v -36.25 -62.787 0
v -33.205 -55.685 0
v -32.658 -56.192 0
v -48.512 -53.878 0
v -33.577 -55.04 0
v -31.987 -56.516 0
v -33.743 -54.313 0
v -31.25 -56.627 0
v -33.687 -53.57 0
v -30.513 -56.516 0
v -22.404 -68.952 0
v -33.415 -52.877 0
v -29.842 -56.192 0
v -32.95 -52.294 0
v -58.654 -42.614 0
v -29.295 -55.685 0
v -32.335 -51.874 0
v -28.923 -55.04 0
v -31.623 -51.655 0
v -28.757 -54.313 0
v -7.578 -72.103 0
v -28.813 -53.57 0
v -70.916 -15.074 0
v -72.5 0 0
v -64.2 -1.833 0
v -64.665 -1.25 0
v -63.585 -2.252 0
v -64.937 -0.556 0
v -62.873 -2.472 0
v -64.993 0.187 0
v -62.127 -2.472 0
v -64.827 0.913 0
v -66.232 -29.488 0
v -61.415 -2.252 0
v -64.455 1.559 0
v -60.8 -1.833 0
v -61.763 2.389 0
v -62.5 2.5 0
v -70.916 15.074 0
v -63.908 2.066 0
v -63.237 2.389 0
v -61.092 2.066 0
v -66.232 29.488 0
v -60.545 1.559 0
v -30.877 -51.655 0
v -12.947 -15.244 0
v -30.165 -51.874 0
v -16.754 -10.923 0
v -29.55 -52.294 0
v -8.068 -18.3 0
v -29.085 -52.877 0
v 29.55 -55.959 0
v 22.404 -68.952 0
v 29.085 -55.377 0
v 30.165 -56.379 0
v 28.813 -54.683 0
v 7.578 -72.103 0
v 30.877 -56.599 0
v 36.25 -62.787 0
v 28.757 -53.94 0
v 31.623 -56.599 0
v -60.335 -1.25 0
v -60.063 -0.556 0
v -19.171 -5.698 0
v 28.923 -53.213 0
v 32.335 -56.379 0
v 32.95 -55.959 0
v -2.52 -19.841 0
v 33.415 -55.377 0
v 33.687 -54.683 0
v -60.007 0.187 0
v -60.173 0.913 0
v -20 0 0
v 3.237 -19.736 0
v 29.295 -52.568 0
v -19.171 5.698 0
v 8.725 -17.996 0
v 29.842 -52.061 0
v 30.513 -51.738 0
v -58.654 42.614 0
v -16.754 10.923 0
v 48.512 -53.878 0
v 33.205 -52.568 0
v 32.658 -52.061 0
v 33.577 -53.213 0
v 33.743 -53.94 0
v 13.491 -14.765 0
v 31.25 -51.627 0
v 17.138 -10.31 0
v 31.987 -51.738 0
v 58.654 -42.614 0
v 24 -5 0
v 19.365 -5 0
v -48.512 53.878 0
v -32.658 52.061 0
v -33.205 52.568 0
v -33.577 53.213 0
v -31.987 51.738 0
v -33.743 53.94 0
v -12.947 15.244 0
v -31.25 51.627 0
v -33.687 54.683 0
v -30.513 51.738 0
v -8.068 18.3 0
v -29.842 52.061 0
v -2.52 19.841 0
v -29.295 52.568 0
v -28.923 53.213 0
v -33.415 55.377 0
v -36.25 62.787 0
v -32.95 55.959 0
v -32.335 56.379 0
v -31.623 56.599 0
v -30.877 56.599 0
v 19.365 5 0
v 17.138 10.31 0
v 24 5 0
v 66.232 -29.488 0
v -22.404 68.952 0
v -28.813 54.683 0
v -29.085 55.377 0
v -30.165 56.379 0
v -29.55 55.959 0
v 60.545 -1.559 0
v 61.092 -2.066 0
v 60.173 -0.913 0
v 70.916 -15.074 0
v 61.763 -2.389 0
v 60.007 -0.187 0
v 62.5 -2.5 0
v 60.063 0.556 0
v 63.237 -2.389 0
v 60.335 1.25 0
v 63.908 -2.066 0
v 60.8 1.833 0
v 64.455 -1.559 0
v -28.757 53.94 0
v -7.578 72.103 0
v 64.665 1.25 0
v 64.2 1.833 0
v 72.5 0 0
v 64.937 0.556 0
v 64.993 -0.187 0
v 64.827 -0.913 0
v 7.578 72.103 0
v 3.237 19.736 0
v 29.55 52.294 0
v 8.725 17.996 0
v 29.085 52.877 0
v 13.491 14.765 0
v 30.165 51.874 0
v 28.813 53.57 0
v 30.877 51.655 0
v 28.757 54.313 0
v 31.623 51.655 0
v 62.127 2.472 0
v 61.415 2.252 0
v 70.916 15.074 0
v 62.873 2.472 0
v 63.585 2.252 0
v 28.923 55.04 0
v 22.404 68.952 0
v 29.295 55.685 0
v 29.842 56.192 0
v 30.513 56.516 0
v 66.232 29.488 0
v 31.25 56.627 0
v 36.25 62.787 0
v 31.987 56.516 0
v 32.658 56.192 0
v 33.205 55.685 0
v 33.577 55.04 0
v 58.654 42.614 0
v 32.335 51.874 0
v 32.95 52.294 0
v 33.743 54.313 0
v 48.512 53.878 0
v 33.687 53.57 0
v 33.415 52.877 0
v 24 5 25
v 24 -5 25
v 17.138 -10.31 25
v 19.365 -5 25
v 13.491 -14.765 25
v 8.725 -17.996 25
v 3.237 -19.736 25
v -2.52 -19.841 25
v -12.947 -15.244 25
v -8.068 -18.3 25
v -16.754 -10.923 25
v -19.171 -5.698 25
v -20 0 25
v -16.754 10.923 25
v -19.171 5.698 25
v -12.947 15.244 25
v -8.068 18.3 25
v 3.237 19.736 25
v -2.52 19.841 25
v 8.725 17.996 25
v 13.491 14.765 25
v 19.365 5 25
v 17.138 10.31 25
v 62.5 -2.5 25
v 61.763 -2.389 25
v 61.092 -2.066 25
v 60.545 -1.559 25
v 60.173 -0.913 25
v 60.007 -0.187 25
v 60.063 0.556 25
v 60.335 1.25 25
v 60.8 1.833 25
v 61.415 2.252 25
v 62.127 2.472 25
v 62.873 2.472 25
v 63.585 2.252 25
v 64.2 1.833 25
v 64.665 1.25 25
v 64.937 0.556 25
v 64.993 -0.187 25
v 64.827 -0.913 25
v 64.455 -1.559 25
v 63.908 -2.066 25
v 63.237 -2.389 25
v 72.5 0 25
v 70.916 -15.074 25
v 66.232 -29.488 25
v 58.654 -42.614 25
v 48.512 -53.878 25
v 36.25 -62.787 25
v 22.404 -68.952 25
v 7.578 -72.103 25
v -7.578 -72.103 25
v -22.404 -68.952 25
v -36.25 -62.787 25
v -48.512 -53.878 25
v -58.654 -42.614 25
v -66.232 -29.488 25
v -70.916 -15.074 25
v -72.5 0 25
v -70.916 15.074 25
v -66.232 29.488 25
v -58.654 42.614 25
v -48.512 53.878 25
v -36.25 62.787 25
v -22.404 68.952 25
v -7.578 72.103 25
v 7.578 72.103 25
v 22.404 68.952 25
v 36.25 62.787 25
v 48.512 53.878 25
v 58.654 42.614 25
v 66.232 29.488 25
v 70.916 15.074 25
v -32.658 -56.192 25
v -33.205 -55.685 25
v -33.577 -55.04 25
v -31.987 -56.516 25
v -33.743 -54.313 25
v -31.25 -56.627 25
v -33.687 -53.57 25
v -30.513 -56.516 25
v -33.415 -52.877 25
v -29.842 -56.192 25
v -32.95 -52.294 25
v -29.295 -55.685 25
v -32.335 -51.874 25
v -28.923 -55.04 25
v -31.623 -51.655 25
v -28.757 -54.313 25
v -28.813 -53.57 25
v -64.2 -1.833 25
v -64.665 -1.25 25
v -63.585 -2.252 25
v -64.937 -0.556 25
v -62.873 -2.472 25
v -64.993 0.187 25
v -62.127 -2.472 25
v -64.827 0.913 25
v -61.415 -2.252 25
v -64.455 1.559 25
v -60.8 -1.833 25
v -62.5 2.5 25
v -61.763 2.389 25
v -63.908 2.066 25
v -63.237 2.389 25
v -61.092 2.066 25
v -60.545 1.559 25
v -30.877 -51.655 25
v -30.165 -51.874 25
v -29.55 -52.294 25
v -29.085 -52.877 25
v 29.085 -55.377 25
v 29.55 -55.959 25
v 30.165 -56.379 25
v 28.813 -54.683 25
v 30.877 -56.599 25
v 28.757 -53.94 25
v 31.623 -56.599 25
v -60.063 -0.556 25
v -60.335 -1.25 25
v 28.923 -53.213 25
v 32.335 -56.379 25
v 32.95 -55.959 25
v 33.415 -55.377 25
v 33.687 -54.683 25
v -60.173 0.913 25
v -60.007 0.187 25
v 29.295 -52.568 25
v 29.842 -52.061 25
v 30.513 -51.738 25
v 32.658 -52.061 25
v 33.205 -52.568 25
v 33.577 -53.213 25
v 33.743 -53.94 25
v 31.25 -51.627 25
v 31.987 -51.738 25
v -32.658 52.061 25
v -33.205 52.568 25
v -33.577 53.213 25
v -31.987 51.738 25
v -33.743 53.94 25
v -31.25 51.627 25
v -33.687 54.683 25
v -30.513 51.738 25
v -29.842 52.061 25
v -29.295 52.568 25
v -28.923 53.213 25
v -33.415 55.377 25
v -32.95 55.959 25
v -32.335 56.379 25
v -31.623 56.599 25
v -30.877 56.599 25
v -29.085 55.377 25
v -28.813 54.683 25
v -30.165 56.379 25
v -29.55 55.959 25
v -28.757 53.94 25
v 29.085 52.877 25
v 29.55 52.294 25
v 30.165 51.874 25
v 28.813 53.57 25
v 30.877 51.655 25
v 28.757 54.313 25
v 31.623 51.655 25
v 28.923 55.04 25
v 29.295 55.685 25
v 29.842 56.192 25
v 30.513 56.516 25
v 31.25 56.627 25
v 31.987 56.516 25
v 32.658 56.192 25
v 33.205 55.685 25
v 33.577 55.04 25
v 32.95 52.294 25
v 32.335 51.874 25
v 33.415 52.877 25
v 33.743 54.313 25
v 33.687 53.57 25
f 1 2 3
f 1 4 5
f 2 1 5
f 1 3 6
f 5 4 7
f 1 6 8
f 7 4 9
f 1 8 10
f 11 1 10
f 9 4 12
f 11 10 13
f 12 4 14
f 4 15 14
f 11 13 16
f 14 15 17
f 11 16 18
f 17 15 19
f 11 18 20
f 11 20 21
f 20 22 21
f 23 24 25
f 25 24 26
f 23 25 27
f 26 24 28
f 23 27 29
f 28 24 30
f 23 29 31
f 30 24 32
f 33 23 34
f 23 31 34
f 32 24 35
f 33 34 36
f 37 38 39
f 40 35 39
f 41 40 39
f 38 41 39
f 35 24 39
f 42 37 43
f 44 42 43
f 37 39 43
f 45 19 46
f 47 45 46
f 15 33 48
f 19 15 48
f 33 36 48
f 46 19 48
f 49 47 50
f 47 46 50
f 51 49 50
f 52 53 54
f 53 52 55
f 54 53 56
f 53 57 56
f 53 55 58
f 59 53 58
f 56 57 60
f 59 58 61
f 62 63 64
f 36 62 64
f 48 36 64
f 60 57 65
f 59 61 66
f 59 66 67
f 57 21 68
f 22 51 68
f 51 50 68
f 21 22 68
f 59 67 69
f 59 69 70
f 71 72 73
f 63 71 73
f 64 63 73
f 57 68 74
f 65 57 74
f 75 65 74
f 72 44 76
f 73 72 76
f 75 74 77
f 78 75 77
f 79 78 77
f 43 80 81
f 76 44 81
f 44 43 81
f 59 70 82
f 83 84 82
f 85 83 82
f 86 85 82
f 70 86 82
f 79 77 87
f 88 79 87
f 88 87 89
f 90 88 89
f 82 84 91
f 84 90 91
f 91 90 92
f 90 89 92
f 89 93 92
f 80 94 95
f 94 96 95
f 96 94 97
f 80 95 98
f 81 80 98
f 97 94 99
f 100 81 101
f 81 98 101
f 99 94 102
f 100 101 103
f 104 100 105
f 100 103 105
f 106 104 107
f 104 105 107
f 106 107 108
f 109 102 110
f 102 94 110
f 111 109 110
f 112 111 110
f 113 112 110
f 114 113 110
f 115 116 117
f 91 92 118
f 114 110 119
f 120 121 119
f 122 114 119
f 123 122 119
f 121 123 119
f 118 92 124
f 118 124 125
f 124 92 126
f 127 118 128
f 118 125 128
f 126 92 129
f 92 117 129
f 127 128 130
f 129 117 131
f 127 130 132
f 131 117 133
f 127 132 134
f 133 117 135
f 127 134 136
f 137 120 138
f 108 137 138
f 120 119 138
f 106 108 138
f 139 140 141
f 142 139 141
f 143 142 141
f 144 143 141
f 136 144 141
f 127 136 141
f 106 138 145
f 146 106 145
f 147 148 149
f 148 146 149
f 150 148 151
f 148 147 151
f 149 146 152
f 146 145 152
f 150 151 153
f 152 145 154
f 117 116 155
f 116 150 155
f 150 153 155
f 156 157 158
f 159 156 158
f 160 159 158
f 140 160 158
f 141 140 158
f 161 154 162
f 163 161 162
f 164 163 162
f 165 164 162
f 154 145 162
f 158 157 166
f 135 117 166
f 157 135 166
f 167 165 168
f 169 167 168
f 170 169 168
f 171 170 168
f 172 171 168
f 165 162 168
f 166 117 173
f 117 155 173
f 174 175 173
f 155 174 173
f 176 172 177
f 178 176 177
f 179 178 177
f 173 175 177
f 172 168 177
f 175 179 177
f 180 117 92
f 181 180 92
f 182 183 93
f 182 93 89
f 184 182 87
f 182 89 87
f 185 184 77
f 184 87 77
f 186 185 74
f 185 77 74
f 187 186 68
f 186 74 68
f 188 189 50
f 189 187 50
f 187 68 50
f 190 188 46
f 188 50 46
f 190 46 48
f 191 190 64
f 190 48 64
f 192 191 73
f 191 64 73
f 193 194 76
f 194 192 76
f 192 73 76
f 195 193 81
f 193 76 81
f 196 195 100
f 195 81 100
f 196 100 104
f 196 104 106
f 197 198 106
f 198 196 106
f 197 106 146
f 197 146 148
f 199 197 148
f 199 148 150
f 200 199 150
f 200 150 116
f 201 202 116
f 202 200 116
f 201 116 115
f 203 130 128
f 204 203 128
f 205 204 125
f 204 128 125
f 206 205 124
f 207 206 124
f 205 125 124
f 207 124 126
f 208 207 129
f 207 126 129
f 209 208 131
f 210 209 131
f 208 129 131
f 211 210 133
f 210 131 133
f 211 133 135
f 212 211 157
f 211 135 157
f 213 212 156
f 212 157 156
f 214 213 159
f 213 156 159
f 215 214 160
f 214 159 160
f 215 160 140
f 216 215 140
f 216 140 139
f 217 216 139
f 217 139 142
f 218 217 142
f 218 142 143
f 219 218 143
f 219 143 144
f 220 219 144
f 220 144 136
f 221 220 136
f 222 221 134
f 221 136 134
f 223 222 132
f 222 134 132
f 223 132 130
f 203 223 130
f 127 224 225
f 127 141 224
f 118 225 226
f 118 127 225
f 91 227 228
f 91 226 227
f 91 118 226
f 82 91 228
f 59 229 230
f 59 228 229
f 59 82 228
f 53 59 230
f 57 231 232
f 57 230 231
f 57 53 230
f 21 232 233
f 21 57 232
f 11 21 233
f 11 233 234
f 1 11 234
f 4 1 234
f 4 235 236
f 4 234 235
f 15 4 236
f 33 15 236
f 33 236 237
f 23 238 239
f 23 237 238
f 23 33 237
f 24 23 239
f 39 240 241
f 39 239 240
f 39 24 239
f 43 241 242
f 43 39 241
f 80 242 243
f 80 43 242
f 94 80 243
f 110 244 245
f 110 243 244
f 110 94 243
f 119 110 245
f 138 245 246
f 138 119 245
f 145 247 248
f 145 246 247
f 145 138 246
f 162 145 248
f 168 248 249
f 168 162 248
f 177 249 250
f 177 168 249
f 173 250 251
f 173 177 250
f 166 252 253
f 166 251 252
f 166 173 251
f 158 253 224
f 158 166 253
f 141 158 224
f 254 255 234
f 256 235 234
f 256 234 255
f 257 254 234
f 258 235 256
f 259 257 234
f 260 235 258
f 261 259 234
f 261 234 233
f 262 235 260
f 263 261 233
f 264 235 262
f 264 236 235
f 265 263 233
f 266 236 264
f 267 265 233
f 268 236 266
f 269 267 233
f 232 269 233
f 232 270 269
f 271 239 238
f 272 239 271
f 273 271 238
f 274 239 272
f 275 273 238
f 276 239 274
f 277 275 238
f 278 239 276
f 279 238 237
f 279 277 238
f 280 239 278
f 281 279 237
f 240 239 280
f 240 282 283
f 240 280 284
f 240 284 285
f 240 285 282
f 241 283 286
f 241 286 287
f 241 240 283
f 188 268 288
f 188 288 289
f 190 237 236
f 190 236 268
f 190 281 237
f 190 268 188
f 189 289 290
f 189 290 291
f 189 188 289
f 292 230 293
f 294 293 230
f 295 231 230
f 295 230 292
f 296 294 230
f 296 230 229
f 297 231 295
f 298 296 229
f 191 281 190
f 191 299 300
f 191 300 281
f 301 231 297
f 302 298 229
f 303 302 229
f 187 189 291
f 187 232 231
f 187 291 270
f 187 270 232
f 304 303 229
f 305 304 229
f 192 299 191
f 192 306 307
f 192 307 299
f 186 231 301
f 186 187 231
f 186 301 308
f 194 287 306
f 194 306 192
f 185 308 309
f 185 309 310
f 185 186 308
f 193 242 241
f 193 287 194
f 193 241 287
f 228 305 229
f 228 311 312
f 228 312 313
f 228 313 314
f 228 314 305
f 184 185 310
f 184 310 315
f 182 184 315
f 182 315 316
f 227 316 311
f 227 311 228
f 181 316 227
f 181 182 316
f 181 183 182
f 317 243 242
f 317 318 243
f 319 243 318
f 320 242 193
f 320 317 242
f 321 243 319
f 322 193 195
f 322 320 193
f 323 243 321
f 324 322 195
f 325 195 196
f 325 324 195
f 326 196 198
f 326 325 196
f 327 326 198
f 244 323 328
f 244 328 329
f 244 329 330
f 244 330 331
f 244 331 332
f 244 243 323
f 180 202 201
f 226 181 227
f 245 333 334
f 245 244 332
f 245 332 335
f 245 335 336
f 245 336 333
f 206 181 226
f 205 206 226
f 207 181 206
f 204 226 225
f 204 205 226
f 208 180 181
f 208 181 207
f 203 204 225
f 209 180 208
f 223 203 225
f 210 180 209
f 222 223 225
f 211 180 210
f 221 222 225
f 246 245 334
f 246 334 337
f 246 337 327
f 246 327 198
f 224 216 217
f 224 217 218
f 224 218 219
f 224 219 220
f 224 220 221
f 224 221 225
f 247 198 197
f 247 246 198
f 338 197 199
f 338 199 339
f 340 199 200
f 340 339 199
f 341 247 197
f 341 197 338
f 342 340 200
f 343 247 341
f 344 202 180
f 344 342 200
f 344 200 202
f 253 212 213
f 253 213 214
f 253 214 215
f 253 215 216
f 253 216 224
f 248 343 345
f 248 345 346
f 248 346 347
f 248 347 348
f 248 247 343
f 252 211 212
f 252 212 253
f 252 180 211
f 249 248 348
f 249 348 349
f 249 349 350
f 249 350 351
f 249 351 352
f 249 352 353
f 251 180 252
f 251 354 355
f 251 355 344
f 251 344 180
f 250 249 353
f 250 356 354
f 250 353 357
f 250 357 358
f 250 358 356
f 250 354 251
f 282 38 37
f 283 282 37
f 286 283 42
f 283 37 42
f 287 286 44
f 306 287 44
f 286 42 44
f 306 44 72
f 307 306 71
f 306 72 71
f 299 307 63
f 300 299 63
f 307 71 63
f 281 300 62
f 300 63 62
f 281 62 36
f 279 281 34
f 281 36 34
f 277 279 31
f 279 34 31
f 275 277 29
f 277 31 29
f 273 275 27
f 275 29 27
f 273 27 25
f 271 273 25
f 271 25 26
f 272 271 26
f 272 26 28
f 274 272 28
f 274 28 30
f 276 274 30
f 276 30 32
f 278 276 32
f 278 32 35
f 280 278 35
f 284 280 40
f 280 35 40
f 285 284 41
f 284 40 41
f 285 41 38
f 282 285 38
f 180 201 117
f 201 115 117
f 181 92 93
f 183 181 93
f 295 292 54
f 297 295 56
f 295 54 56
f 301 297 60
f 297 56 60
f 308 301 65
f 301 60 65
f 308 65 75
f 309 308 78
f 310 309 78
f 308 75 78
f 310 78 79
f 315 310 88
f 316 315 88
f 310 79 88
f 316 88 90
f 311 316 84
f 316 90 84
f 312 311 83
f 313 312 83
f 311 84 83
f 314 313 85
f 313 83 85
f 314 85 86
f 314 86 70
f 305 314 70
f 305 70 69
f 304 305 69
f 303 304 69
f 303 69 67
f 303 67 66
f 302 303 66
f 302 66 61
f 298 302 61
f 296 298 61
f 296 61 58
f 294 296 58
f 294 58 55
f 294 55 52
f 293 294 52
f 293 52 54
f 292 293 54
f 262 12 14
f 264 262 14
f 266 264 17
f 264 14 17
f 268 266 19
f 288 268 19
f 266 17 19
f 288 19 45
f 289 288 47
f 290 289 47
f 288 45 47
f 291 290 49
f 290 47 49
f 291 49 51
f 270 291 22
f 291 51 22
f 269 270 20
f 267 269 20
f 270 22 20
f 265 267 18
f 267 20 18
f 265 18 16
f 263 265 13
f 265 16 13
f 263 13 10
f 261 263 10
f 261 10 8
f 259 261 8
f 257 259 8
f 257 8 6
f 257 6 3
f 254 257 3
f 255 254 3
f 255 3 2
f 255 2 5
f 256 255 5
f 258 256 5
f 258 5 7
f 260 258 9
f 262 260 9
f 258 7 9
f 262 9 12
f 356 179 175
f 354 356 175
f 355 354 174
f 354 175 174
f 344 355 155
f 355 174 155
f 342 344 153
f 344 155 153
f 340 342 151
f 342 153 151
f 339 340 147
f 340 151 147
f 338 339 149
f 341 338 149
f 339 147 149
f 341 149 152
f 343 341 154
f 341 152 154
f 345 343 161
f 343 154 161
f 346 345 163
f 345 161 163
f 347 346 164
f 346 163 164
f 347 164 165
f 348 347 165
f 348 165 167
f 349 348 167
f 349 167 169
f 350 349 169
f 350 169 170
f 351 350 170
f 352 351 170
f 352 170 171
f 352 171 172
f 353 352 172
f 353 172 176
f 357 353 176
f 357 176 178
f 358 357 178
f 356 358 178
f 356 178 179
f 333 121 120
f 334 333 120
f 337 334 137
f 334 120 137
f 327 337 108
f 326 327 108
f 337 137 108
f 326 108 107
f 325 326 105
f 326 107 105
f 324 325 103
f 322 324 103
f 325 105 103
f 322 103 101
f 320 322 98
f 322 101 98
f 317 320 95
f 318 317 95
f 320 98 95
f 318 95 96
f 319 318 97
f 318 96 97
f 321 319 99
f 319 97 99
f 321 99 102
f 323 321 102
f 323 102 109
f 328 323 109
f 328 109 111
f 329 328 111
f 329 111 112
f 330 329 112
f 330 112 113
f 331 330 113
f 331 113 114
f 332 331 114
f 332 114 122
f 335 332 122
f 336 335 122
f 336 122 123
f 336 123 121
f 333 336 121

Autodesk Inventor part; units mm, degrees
ref_plane "YZ Plane" through (0, 0, 0) normal (1, 0, 0) x (0, 1, 0)
ref_plane "XZ Plane" through (0, 0, 0) normal (0, 1, 0) x (-1, 0, 0)
ref_plane "XY Plane" through (0, 0, 0) normal (0, 0, 1) x (1, 0, 0)
ref_plane "Płaszczyzna konstrukcyjna1" through (0, 0, 0) normal (0, 0, 1) x (1, 0, 0)
sketch "Szkic1" plane through (0, 0, 0) normal (0, 0, 1) x (1, 0, 0)
  circle A0 centre (0, 0) radius 72.5 projected
  circle A1 centre (0, 0) radius 35.3971 projected
  arc A2 (19.3649, 5) -> (19.3649, -5) centre (0, 0) ccw projected
  line L0 (24, 5) -> (24, -5) projected
  line L1 (24, -5) -> (19.3649, -5) projected
  line L2 (19.3649, 5) -> (24, 5) projected
extrude "Wyciągnięcie proste1" add sketch "Szkic1" along normal blind 25 contours A0 | A1
sketch "Szkic2" plane through (0, 0, 25) normal (0, 0, 1) x (1, 0, 0)
  circle A0 centre (62.5, 0) radius 2.4585 projected
  point P0 (0, 0)
hole "Otwór1" at (62.5, 0, 25) direction (0, 0, -1) diameter 5 end through all
pattern_circular "Szyk kołowy1" count 6 over 360 about axis through (0, 0, -10) along (0, 0, 1) of "Otwór1"
properties material "Stal nierdzewna"
